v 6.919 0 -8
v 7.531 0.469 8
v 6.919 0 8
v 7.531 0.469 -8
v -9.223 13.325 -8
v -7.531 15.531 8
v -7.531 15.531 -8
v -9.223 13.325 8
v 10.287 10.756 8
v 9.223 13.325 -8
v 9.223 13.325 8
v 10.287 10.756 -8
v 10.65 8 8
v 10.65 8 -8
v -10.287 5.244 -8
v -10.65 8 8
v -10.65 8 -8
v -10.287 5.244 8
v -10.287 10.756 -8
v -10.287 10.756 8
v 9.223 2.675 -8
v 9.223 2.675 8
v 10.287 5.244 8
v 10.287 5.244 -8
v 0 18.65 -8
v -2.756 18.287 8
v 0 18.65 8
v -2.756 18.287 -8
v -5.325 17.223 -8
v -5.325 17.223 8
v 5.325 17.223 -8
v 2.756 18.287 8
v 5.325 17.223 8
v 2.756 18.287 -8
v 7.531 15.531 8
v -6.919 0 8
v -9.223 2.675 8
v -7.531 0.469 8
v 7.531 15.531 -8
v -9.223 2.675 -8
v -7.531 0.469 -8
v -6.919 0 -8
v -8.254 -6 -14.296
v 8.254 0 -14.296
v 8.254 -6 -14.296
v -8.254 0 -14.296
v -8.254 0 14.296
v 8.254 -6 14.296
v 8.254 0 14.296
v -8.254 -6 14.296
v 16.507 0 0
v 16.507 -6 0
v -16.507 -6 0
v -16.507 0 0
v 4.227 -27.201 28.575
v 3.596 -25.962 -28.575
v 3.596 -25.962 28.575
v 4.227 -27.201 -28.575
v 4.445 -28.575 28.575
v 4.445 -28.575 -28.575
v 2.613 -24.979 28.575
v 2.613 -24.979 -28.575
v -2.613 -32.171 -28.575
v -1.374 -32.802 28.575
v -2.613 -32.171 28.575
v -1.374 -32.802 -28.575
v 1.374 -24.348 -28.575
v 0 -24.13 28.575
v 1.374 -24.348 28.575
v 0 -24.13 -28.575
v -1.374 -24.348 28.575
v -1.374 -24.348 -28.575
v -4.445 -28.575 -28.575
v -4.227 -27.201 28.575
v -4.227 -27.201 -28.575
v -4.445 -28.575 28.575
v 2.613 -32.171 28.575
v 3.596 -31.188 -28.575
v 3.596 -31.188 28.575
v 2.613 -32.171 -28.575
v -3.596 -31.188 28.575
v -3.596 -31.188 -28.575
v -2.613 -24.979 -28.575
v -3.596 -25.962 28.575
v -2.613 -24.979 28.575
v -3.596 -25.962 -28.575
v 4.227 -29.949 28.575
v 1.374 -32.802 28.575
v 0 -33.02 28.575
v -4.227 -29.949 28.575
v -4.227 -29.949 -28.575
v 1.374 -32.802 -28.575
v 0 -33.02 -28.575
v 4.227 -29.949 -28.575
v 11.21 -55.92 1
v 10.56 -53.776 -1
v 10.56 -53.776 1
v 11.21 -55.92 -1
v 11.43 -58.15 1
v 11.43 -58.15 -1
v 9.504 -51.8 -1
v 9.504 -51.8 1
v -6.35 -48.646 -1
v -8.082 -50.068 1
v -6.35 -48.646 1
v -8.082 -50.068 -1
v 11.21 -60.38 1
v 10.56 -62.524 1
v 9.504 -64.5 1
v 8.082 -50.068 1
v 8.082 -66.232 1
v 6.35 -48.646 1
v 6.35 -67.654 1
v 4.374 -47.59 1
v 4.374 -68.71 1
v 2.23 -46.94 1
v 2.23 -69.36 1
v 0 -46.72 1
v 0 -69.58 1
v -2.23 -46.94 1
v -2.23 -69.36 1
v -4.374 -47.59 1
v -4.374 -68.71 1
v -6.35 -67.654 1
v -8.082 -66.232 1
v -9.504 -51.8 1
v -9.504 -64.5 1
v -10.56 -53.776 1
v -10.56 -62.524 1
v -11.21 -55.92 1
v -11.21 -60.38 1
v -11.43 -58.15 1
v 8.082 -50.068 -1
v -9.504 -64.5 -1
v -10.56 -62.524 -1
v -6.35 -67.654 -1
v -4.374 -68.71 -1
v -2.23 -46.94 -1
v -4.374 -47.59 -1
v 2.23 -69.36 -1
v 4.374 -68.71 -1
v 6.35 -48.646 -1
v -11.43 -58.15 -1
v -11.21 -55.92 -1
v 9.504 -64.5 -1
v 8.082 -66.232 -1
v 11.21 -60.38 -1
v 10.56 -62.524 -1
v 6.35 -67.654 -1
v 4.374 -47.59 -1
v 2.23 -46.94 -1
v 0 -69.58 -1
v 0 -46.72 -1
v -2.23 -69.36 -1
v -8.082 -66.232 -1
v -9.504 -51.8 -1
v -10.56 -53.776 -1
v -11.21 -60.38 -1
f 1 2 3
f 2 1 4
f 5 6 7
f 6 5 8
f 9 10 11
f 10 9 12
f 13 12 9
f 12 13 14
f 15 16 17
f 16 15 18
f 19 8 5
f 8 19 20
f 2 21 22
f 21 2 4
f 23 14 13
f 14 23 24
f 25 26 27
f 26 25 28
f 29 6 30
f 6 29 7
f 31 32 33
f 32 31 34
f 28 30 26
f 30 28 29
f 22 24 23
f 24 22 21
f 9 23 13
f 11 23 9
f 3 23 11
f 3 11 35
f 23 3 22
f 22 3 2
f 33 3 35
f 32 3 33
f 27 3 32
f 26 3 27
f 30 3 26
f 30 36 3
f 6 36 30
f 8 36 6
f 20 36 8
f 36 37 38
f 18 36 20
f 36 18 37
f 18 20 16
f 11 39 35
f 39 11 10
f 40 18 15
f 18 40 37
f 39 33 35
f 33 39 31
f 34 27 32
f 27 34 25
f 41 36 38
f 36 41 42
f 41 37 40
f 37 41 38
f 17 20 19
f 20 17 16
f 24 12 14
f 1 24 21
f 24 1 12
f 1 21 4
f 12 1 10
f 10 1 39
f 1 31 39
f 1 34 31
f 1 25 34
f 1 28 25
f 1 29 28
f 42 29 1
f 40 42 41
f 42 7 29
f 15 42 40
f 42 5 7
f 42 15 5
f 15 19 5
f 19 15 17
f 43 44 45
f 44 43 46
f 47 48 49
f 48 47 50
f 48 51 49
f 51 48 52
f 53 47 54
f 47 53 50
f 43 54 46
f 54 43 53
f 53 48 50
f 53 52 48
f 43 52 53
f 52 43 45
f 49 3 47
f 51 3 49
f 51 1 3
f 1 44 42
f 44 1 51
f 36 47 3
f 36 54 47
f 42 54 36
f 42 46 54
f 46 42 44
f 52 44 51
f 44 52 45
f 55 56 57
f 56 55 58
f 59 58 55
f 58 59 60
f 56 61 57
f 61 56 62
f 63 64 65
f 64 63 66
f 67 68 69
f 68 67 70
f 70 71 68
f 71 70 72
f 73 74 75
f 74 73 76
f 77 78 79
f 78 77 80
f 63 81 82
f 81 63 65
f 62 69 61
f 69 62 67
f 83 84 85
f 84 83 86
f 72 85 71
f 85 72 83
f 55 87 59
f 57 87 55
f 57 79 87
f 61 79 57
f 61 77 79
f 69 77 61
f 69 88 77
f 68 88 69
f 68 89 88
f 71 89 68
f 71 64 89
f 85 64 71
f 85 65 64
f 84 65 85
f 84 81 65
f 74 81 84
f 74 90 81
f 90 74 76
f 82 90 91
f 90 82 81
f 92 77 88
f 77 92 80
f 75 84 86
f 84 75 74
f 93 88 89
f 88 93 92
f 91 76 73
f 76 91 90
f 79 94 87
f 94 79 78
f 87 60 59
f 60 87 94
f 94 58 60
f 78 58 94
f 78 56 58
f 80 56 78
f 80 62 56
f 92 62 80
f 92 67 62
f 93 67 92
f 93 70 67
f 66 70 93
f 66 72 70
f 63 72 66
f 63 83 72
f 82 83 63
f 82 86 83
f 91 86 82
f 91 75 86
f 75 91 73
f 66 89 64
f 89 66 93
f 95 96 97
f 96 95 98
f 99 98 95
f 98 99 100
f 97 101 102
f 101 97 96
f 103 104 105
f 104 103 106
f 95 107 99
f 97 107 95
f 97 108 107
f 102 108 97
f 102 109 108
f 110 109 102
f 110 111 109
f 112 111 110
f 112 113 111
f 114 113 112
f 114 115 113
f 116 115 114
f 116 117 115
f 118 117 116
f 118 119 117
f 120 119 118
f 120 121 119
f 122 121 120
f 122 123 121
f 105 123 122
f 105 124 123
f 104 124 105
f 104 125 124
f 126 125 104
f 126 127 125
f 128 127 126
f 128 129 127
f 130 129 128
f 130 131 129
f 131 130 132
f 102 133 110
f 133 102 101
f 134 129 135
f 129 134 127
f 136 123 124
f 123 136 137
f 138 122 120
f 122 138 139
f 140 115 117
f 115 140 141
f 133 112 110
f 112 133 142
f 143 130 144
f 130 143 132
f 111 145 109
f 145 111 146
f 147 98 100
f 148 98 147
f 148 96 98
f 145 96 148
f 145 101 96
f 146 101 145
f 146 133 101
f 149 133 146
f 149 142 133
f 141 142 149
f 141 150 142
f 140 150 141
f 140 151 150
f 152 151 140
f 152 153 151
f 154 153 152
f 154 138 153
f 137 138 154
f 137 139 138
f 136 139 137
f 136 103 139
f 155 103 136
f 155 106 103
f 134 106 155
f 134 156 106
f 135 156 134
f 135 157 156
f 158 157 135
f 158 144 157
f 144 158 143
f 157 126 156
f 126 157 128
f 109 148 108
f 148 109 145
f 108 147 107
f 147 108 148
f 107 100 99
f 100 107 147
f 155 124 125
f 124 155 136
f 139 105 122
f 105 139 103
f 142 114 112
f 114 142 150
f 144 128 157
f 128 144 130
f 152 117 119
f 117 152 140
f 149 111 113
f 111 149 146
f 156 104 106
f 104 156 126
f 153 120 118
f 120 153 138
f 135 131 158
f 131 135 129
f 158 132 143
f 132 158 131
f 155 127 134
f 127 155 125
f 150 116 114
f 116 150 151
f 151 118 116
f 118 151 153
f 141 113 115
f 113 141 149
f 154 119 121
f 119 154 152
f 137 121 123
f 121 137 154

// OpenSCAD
// Auto-generated by scripts/author_from_manifest.py (Phase D.3).
// Source: data/phase_d_manifest.json (sku_intent='globe-gl5616-pendent-200f').
// Do not hand-edit — regenerate from the manifest.
//
// @part globe_gl5616_pendent_200f
// @kind sprinkler_head
// @category head.pendant.k56
// @display-name "Globe GL5616 Pendent K5.6 SR 200°F"
// @mfg globe_fire_sprinkler
// @mfg-pn GL5616
// @listing UL FM
// @hazard-classes LH OH1
// @price-usd 11.95
// @install-minutes 8
// @crew journeyman
// @k-factor 5.6
// @orientation pendant
// @response standard
// @temperature 200F
// @param size_in number default=0.5 label="Size" unit="in"
// @port inlet position=[0,0.014,0] direction=[0,1,0] style=NPT_threaded size_in=0.5 role=drop

size_in = 0.5;
k_factor = 5.6;

length_mm   = 57.15;
body_dia_mm = 25.40;
thread_od   = 21.3;
thread_len  = 16;
deflector_d = body_dia_mm * 0.9;

 union() {
    translate([0, thread_len/2, 0])
        cylinder(h = thread_len, d = thread_od, center = true, $fn = 24);
    translate([0, -3, 0])
        rotate([90, 0, 0])
        cylinder(h = 6, d = thread_od * 1.55, $fn = 6, center = true);
    translate([0, -length_mm/2, 0])
        cylinder(h = length_mm, d = body_dia_mm * 0.35, center = true, $fn = 20);
    translate([0, -length_mm - 1, 0])
        cylinder(h = 2, d = deflector_d, center = true, $fn = 32);
}
